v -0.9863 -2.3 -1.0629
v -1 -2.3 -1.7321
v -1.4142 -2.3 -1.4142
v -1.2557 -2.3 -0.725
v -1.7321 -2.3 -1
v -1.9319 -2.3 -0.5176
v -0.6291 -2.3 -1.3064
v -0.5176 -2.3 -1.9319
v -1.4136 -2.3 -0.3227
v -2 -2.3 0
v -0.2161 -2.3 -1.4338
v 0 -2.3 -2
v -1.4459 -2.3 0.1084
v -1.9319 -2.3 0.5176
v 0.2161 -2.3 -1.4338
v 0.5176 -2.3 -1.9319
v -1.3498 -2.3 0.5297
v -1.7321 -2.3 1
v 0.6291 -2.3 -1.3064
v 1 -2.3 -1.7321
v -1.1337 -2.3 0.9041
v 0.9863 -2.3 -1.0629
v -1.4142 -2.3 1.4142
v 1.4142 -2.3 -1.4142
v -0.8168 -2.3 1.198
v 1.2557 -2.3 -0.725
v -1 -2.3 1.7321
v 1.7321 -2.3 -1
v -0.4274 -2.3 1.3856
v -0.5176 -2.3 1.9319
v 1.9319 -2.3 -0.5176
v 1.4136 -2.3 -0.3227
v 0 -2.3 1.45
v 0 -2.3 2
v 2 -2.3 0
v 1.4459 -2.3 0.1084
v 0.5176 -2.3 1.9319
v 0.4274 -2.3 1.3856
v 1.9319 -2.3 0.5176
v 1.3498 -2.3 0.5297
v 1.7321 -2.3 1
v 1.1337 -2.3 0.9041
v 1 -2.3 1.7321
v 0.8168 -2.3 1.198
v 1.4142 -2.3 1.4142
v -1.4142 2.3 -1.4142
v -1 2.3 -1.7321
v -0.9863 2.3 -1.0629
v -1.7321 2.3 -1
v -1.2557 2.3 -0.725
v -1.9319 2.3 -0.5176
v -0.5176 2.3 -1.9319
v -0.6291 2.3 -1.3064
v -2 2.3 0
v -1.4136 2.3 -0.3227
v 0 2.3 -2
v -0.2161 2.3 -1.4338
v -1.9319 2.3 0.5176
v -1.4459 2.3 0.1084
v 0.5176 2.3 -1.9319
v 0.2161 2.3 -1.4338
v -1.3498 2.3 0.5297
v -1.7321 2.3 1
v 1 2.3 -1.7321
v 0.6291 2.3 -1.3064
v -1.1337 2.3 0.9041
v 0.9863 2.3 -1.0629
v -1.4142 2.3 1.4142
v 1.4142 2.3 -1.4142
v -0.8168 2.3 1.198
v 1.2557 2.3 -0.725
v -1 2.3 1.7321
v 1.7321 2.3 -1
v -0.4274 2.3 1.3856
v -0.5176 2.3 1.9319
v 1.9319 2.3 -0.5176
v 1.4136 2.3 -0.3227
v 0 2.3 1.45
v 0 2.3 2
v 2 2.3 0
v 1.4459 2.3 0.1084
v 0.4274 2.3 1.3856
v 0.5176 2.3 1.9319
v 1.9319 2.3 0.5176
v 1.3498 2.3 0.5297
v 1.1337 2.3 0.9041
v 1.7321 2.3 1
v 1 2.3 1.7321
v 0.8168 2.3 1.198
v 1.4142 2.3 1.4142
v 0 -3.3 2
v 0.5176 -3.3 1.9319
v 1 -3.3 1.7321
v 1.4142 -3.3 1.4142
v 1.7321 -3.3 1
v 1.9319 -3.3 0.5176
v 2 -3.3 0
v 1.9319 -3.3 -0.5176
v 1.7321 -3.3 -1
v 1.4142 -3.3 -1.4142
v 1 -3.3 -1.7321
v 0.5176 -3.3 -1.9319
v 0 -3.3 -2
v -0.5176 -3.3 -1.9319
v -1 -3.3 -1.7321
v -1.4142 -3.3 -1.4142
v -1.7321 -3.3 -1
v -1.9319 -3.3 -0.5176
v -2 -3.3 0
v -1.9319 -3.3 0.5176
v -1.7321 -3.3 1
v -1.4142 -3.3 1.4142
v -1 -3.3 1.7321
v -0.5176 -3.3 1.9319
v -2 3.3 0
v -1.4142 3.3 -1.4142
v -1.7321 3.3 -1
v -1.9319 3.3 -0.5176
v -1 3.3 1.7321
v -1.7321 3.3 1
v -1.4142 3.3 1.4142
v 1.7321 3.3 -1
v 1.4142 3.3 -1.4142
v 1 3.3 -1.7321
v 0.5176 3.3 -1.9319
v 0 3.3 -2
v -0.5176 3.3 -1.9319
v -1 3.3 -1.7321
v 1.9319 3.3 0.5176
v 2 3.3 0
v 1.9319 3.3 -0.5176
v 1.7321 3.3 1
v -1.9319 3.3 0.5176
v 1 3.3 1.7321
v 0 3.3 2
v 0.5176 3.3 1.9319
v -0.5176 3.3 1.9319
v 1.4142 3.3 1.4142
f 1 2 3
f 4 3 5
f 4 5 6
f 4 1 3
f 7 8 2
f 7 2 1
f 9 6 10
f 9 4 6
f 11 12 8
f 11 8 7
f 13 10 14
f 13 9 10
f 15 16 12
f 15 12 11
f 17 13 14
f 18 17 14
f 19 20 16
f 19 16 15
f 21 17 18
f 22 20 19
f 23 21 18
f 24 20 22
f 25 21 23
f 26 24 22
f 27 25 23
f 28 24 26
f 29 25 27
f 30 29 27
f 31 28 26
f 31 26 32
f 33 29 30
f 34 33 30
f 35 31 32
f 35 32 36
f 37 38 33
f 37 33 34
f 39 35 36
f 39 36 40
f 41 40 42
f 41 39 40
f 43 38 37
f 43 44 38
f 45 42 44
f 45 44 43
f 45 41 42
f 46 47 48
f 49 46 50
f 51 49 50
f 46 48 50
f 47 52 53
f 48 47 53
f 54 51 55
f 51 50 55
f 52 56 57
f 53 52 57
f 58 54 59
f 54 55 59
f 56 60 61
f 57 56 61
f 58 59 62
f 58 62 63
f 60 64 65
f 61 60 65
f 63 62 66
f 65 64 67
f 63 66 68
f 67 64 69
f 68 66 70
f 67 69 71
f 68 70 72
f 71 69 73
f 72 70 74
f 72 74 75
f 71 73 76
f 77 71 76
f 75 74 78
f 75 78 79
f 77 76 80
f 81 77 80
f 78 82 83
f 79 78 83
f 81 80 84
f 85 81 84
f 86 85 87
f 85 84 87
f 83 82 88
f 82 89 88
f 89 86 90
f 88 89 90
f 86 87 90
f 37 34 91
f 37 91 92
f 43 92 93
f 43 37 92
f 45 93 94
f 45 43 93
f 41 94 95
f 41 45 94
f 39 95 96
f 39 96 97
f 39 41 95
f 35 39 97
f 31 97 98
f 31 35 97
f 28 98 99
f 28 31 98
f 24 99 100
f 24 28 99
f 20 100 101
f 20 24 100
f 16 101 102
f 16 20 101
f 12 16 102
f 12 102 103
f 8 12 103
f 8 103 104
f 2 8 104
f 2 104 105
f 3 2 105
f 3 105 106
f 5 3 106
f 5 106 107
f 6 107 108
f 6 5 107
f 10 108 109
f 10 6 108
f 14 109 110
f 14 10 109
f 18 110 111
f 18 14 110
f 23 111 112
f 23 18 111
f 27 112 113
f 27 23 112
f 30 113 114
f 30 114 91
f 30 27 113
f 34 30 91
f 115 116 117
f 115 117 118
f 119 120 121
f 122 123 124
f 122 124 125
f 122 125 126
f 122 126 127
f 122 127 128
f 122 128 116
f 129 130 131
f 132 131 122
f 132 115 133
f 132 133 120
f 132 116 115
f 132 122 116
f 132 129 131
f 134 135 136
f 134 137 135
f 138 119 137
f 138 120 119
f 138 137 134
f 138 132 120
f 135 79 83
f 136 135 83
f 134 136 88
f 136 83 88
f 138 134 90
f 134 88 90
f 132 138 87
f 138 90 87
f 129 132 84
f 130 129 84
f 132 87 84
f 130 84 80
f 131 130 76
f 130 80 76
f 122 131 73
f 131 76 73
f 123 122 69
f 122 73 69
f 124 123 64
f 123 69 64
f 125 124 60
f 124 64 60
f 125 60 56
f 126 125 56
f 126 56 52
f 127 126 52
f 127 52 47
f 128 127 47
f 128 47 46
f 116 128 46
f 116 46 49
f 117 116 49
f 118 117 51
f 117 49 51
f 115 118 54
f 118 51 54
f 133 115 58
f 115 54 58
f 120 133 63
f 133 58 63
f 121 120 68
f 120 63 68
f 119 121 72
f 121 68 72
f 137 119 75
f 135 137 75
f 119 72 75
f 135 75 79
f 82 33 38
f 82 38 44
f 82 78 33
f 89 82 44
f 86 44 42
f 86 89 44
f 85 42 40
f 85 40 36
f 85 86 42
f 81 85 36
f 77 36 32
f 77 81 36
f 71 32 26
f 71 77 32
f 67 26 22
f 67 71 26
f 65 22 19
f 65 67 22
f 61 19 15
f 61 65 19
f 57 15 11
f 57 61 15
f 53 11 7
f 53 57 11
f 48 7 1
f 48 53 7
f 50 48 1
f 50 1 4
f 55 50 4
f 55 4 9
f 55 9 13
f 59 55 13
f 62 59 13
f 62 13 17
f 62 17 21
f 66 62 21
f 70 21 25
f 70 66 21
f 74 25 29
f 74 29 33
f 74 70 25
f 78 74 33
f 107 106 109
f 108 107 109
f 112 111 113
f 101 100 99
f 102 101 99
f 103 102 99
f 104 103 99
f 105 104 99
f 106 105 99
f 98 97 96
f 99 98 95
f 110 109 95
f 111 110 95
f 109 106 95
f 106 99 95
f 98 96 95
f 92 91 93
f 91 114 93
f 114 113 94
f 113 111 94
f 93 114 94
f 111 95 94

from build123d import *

# Parameters (mm, degrees)
SKETCH1_R      = 1.45
MID_BODY_DEPTH = 2.3
SKETCH2_R      = 2
TOP_HEAD_DEPTH = 1


with BuildPart() as part:
    # Sketch1 → MID BODY (new, symmetric)
    with BuildSketch(Plane(origin=(0, 0, 0), x_dir=(1, 0, 0), z_dir=(0, 1, 0))):
        with Locations(Location((0, 0, 0), (0, 0, 270))):
            Circle(SKETCH1_R)
    extrude(amount=MID_BODY_DEPTH, both=True)

    # Sketch2 → TOP HEAD (add)
    with BuildSketch(Plane(origin=(0, 2.3, 0), x_dir=(1, 0, 0), z_dir=(0, 1, 0))):
        with Locations(Location((0, 0, 0), (0, 0, 270))):
            Circle(SKETCH2_R)
    top_head = extrude(amount=TOP_HEAD_DEPTH)

    # BOTTOM HEAD: TOP HEAD across plane
    add(top_head.mirror(Plane.ZX))


solid = part.part
